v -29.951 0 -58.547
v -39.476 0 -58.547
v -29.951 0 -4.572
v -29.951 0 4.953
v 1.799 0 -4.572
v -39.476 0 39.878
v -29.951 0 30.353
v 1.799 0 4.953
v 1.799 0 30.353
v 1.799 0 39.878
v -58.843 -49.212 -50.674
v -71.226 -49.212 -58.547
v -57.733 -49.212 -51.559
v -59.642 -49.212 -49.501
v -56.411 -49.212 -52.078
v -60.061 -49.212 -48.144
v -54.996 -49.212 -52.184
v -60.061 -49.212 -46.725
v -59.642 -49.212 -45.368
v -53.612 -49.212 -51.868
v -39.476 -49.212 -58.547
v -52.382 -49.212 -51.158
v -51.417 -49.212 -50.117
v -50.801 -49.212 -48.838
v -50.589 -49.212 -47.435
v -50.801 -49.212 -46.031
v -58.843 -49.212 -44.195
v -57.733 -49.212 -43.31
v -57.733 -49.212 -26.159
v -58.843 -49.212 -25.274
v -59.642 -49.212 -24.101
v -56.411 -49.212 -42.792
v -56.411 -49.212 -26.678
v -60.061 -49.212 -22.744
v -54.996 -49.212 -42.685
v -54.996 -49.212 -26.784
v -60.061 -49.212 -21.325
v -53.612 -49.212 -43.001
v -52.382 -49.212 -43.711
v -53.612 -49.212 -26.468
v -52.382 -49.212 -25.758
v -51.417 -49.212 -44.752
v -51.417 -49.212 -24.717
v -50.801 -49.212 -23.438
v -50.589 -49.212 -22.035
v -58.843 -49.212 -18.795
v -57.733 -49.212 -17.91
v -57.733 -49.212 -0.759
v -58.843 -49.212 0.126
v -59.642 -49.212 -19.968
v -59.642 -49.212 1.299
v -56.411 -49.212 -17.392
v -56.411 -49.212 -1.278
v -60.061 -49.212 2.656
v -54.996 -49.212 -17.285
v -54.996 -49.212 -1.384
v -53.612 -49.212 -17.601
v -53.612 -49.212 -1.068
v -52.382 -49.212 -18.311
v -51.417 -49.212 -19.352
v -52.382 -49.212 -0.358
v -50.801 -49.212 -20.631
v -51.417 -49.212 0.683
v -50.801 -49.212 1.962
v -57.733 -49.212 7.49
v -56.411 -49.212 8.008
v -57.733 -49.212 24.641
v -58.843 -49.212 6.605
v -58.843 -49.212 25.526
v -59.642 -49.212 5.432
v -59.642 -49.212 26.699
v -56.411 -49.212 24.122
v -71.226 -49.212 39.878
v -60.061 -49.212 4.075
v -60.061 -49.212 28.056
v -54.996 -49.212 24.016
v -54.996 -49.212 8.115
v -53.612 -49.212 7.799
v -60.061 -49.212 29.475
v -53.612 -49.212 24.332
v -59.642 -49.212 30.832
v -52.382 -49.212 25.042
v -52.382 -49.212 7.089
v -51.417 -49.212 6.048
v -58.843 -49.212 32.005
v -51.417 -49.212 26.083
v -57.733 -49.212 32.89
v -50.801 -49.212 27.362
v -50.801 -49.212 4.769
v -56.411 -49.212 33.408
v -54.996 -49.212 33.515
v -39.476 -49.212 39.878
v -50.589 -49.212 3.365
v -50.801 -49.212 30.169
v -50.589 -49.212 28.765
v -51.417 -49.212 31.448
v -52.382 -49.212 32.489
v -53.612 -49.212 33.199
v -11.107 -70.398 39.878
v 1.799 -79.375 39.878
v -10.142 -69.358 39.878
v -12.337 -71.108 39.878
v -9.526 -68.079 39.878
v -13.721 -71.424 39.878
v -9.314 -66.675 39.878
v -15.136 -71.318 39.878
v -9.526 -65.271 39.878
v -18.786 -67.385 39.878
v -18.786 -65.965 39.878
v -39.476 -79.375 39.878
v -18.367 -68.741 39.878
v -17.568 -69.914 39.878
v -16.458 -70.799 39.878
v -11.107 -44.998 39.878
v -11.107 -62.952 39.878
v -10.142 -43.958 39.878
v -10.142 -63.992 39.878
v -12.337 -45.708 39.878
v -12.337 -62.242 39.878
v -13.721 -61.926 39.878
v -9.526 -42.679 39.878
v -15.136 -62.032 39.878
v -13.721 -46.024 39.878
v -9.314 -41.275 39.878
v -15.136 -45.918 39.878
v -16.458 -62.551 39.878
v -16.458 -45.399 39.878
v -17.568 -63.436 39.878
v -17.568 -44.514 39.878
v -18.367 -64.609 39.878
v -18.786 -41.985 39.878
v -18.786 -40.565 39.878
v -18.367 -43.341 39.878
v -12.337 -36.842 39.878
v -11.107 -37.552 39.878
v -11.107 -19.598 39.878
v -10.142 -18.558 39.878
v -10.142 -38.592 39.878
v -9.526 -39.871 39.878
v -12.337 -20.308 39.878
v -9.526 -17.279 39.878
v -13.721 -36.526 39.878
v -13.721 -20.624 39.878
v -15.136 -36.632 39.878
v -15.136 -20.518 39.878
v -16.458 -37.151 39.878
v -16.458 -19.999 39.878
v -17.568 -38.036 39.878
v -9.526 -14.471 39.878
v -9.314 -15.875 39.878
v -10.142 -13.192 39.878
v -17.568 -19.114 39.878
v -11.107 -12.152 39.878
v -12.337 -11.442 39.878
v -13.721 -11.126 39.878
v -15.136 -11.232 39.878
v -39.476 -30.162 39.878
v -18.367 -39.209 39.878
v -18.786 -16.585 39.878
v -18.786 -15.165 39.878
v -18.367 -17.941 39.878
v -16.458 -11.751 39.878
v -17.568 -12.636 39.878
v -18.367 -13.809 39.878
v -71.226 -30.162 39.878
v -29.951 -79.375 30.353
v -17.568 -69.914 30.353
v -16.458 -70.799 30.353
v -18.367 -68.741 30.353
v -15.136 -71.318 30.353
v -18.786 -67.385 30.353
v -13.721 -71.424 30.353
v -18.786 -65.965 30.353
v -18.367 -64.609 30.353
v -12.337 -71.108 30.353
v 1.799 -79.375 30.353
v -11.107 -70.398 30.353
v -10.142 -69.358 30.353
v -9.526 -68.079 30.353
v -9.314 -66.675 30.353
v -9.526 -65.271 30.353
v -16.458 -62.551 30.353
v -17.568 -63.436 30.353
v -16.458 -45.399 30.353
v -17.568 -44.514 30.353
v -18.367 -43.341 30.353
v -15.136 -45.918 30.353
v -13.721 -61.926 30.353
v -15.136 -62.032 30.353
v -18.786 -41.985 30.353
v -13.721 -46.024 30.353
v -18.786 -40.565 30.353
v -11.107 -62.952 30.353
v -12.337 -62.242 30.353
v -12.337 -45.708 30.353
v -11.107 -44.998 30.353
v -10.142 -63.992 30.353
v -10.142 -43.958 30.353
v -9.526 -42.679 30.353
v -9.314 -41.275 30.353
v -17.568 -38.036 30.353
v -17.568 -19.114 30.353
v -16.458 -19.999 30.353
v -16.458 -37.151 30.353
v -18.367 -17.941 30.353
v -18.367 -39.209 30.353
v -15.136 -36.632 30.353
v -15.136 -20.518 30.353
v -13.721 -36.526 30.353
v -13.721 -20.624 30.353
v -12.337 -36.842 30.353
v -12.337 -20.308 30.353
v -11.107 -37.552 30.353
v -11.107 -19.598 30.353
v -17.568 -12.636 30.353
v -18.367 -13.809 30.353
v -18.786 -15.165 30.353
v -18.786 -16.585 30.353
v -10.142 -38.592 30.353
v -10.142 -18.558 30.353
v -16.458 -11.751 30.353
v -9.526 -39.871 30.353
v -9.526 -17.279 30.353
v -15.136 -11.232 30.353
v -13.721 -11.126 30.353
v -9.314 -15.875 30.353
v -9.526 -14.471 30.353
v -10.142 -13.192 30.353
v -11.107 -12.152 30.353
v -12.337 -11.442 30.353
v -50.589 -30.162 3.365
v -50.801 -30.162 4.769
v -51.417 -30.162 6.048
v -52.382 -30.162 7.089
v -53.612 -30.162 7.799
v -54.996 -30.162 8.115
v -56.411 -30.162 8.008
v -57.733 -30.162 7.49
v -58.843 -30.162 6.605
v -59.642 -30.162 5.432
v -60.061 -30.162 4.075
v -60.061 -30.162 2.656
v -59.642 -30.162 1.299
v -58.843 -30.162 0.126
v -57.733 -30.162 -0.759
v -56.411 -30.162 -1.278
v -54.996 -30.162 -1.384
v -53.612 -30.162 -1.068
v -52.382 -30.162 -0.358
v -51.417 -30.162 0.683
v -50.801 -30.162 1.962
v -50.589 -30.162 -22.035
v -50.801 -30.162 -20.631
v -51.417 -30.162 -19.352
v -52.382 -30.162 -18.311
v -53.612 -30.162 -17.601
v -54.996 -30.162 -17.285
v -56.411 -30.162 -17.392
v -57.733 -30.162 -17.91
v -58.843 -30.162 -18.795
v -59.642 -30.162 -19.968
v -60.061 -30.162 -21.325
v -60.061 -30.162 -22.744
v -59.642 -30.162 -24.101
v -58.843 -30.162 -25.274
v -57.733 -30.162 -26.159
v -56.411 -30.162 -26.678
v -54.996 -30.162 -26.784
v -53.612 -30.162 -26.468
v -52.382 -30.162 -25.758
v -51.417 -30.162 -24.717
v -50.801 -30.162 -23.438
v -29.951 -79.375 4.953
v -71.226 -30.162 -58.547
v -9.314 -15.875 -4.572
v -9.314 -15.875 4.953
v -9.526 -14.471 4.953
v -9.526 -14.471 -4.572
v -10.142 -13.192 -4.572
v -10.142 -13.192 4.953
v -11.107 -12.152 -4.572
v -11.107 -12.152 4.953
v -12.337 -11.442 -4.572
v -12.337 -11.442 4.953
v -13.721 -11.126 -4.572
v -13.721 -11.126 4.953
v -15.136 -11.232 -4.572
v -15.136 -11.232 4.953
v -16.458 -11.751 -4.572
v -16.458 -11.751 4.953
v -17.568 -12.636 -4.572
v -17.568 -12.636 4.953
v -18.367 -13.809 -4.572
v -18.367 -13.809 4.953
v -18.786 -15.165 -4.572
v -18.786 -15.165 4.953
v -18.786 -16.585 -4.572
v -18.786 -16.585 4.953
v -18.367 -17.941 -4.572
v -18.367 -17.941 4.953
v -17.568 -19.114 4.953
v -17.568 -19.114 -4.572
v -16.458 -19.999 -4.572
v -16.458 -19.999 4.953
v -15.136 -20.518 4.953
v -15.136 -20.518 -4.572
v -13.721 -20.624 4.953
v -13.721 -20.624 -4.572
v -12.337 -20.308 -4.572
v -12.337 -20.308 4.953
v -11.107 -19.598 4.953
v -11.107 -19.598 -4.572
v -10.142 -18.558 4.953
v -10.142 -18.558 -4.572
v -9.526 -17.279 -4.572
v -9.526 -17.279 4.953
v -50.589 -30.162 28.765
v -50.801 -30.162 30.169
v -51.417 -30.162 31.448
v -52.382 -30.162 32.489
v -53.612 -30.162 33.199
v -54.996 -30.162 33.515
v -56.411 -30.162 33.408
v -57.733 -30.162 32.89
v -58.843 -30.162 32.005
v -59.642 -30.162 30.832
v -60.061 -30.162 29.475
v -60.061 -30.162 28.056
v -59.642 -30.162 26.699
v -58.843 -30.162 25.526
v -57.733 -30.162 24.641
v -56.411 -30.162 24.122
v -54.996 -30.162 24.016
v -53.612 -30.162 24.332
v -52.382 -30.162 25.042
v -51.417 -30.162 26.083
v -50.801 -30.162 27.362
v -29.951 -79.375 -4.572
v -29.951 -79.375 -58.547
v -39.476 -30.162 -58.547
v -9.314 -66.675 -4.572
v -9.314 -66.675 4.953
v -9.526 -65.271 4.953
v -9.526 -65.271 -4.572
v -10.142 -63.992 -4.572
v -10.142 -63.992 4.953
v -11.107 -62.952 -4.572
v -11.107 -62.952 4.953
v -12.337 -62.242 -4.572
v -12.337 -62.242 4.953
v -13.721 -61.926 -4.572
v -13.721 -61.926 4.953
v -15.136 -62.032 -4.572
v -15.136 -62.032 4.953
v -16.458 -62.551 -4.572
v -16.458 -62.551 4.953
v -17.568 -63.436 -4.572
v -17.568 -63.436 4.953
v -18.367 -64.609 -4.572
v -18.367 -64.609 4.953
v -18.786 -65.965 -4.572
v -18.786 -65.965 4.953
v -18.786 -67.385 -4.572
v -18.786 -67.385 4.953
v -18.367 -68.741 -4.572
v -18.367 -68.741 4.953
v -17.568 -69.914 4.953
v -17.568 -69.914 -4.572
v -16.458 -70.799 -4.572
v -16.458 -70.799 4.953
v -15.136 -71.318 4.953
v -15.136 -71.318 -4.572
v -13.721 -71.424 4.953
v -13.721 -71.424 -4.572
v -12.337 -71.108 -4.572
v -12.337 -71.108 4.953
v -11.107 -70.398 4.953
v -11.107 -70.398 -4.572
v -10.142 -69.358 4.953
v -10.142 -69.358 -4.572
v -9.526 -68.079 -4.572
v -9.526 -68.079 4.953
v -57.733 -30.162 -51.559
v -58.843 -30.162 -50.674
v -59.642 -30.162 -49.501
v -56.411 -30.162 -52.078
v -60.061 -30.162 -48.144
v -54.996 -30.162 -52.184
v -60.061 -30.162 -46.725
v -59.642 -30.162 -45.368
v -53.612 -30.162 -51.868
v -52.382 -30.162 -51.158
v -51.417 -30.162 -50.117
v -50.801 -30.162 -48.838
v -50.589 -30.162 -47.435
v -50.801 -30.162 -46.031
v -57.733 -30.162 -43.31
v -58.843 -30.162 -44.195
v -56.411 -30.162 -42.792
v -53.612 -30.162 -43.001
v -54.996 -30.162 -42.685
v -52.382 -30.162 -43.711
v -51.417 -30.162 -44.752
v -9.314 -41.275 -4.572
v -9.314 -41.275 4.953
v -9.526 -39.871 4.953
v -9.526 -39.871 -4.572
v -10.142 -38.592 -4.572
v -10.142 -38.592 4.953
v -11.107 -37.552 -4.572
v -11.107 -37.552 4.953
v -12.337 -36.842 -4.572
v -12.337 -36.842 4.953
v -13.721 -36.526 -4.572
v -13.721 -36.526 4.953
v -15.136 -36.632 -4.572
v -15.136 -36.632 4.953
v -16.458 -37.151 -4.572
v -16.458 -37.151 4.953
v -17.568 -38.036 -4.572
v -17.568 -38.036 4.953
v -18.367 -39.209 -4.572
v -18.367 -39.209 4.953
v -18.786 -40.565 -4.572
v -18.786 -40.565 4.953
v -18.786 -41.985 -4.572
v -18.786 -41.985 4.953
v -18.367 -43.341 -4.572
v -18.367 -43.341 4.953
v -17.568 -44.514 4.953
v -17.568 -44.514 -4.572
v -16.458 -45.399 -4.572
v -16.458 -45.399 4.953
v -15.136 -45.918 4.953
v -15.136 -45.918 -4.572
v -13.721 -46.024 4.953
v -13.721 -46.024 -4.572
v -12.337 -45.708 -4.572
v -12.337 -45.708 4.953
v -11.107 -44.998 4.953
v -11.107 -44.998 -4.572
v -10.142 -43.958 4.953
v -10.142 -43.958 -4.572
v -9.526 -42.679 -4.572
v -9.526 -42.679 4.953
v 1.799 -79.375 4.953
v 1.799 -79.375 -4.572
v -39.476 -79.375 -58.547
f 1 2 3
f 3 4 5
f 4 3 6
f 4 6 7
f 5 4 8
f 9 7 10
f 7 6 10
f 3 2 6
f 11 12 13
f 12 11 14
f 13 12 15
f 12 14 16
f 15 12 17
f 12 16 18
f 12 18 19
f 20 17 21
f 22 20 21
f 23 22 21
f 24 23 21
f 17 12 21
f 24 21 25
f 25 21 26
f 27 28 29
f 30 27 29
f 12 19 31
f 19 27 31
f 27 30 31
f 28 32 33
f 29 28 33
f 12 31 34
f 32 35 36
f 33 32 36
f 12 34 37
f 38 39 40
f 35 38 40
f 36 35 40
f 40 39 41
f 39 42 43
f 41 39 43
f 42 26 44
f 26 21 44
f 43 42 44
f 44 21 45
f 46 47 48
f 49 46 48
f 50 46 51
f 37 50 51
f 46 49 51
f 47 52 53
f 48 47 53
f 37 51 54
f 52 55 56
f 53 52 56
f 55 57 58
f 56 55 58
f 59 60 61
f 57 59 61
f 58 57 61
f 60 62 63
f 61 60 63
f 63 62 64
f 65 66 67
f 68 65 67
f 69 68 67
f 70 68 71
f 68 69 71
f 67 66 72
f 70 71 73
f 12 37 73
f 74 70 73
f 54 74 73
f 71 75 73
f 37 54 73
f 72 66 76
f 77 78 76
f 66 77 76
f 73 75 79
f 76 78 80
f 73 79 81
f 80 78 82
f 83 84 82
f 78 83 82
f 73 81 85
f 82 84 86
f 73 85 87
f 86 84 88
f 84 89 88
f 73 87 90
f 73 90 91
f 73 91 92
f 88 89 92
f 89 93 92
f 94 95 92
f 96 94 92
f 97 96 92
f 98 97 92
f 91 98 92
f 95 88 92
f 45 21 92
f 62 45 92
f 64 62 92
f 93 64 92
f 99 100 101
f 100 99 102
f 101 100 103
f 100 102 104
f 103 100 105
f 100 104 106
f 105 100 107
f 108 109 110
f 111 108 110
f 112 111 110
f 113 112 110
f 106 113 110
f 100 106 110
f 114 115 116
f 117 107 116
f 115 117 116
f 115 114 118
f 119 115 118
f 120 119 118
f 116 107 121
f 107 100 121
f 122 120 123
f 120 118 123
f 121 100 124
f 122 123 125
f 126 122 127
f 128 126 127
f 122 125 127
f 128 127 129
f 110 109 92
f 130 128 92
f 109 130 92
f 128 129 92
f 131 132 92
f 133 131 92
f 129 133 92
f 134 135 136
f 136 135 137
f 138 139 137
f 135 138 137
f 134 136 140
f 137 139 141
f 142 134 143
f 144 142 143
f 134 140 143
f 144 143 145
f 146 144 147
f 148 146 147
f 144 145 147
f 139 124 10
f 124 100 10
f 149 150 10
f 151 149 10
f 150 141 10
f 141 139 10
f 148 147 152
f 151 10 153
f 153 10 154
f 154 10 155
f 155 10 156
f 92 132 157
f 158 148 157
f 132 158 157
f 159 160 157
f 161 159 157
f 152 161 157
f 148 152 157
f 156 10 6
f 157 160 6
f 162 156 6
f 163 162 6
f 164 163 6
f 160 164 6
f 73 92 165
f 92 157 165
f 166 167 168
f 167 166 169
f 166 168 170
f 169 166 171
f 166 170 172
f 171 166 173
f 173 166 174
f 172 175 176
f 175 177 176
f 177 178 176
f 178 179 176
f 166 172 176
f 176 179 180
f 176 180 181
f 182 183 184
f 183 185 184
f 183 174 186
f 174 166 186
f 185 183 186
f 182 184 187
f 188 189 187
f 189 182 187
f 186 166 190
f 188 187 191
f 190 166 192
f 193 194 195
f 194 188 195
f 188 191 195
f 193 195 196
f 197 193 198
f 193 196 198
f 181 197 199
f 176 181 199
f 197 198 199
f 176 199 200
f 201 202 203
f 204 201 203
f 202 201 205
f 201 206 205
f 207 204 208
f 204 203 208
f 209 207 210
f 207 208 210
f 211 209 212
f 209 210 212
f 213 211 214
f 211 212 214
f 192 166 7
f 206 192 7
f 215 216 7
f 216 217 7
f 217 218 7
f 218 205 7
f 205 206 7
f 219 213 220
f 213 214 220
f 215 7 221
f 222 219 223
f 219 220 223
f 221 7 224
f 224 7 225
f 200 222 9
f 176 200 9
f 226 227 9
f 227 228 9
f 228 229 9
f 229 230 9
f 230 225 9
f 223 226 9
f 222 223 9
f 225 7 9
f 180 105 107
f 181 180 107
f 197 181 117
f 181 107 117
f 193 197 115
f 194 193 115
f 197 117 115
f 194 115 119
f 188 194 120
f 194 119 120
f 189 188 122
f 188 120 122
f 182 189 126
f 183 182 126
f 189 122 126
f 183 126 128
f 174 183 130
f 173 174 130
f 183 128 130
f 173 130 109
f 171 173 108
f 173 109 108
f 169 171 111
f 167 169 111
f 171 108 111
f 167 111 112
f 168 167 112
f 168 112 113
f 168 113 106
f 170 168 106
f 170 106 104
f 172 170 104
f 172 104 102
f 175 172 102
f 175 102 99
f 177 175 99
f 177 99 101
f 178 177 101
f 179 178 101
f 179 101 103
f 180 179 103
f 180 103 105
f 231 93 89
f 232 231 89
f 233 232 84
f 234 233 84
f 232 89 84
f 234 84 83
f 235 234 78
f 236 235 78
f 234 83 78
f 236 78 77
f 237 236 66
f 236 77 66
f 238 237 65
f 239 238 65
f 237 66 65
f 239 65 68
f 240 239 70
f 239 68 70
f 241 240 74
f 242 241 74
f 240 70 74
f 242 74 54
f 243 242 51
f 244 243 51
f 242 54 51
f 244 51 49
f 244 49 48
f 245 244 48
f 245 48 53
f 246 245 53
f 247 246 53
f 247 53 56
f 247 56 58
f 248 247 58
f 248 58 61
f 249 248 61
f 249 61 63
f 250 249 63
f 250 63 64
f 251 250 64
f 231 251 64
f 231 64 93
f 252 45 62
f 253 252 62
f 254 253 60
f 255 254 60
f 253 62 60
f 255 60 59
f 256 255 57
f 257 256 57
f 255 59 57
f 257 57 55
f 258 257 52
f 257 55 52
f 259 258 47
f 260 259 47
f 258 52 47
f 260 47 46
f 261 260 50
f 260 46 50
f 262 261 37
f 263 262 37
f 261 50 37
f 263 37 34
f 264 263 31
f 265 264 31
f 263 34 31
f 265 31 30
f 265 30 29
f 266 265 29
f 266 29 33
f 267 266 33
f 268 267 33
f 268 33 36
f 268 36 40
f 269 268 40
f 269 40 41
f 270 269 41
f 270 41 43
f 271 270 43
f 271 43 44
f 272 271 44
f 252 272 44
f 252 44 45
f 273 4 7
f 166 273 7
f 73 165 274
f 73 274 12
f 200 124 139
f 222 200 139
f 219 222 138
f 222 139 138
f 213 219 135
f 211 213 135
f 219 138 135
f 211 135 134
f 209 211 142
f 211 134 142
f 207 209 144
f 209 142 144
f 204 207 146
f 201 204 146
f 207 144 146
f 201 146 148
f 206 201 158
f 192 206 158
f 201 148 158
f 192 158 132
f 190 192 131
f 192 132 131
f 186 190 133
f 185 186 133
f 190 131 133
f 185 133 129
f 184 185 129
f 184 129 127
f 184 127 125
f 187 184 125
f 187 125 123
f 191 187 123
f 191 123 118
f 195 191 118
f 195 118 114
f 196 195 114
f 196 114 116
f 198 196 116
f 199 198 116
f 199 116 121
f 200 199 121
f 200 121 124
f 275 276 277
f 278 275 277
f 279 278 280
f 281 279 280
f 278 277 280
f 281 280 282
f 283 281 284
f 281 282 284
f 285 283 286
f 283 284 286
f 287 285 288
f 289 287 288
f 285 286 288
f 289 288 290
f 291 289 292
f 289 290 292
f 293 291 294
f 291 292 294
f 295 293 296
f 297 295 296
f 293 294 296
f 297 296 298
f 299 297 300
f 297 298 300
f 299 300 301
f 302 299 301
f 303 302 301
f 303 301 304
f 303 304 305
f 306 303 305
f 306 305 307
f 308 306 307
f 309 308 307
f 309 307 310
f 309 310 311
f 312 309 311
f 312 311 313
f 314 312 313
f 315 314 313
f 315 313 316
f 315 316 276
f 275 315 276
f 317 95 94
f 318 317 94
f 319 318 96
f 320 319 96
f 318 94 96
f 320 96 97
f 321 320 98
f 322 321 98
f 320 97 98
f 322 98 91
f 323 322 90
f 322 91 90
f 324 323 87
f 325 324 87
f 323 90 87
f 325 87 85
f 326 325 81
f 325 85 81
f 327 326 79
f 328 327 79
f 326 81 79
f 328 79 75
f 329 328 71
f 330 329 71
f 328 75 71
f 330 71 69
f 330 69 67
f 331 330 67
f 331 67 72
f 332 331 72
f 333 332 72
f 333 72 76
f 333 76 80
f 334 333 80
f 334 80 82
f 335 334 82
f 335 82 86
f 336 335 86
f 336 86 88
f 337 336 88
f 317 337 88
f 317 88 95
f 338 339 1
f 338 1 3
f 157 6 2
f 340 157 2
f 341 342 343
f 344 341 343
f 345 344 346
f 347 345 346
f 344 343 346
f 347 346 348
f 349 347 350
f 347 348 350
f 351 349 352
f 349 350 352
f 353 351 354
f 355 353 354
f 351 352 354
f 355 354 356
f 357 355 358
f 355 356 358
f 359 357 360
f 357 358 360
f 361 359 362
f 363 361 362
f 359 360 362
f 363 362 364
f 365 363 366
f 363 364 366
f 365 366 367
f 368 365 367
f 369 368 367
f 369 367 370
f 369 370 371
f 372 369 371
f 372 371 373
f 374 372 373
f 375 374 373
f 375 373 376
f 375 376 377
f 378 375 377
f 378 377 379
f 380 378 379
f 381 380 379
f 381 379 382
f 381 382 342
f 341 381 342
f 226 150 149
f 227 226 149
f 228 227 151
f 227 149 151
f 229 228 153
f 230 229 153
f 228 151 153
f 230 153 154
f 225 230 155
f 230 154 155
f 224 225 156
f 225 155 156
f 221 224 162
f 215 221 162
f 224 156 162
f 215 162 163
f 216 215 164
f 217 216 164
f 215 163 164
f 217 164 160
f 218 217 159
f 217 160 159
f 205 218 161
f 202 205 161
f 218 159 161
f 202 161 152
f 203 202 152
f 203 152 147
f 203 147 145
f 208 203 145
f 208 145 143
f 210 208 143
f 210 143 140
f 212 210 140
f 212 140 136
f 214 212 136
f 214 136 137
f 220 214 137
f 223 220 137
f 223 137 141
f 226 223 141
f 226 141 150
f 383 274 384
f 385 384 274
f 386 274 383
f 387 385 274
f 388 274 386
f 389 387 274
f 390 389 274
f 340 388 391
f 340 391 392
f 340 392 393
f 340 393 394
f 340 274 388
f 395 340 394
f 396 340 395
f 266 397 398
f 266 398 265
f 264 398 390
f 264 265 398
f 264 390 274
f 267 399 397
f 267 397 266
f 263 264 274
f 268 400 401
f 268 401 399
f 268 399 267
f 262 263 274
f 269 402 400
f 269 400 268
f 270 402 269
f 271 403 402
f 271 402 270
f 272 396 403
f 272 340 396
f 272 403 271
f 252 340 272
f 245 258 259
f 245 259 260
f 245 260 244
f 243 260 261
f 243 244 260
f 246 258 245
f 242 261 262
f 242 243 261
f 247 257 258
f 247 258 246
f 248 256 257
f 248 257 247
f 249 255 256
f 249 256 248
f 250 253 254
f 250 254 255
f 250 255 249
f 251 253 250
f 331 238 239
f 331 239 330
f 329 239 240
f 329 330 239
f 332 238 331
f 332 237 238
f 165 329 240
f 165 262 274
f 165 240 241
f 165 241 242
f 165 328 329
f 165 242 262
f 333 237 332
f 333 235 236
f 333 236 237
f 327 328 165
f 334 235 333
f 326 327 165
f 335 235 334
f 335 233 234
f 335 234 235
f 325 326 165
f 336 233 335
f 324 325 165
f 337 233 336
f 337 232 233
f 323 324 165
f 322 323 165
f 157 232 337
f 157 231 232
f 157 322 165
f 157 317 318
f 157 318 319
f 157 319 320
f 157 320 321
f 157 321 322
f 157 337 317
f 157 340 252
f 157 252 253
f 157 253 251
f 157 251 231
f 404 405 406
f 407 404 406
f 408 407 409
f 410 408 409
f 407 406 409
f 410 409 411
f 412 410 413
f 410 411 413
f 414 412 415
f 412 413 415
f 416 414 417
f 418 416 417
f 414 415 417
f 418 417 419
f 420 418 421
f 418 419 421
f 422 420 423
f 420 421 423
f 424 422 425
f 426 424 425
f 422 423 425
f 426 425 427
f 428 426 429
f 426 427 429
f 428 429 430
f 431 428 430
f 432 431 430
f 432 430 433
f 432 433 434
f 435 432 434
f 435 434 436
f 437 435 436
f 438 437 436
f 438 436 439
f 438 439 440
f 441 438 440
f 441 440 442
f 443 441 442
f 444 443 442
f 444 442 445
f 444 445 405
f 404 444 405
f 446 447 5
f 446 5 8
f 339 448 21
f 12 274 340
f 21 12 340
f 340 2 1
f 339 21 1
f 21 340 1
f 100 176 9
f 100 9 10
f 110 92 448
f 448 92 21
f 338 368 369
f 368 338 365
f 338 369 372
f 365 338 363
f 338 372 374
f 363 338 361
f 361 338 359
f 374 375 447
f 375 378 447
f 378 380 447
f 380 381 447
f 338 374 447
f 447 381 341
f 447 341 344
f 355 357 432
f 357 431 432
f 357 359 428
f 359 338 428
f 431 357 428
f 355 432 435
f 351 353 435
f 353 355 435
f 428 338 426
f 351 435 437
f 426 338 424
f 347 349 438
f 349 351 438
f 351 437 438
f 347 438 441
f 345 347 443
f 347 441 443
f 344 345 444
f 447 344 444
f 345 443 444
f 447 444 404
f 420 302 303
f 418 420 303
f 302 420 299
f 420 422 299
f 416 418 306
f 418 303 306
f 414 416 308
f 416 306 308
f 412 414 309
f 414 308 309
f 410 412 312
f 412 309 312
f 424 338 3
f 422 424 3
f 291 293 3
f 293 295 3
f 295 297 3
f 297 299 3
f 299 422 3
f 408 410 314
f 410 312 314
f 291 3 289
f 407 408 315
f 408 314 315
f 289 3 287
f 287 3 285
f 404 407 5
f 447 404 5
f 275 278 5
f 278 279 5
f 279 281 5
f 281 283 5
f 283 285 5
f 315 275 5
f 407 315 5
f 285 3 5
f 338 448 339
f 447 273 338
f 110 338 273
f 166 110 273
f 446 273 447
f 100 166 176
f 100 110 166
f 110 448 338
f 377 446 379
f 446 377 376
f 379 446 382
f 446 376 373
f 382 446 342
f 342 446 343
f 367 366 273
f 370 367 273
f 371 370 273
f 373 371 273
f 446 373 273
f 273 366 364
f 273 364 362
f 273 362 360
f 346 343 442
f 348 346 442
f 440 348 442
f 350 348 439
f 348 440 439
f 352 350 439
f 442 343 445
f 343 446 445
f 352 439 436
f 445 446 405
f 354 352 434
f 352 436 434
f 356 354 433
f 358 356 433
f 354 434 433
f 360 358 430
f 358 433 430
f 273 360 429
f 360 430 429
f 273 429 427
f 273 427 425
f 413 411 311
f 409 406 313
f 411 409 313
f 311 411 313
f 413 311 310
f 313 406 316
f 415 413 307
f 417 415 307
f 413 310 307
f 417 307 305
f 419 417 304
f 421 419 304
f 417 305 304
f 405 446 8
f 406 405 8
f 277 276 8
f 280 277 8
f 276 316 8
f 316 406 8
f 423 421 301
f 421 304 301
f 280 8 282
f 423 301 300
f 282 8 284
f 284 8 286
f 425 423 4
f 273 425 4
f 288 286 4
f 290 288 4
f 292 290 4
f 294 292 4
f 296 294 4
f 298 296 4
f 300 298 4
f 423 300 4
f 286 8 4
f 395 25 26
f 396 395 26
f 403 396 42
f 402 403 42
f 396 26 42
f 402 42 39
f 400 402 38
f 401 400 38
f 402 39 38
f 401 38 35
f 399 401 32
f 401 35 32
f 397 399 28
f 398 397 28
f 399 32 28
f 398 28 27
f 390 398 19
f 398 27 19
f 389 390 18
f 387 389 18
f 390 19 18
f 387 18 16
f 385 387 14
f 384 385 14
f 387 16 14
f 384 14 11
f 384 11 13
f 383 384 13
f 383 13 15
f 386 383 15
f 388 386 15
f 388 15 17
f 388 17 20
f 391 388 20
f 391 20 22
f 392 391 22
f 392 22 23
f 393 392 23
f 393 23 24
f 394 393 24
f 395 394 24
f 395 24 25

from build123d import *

# Parameters (mm, degrees)
F1_DEPTH = 79.375
F2_W     = 19.05
F2_H     = 98.425
F3_DEPTH = 31.75
F4_R     = 4.7625
F5_DEPTH = 49.2135
F6_R     = 4.7625
F7_DEPTH = 98.426


with BuildPart() as f1:
    # F0 (on Front) → F1 (new body)
    with BuildSketch(Plane.XZ):
        Polygon((-39.476471, 39.877854), (-39.476471, -58.547146), (-29.951471, -58.547146), (-29.951471, -4.572146), (1.798529, -4.572146), (1.798529, 4.952854), (-29.951471, 4.952854), (-29.951471, 30.352854), (1.798529, 30.352854), (1.798529, 39.877854), align=None)
    extrude(amount=F1_DEPTH)

    # F2 (on face) → F3 (join)
    with BuildSketch(Plane(origin=(-39.476471, 0, 0), x_dir=(0, -1, 0), z_dir=(-1, 0, 0))):
        with Locations((39.6875, -9.334646)):
            Rectangle(F2_W, F2_H)
    extrude(amount=F3_DEPTH)

    # F4 (on face) → F5 (cut, through all)
    with BuildSketch(Plane.XZ.offset(49.2125)):
        with Locations((-55.351471, 28.765354)):
            Circle(F4_R)
        with Locations((-55.351471, 3.365354)):
            Circle(F4_R)
        with Locations((-55.351471, -22.034646)):
            Circle(F4_R)
        with Locations((-55.351471, -47.434646)):
            Circle(F4_R)
    extrude(amount=-F5_DEPTH, mode=Mode.SUBTRACT)

    # F6 (on face) → F7 (cut, through all)
    with BuildSketch(Plane.XY.offset(39.877854)):
        with Locations((-14.076471, -15.875)):
            Circle(F6_R)
        with Locations((-14.076471, -41.275)):
            Circle(F6_R)
        with Locations((-14.076471, -66.675)):
            Circle(F6_R)
    extrude(amount=-F7_DEPTH, mode=Mode.SUBTRACT)


solid = f1.part
